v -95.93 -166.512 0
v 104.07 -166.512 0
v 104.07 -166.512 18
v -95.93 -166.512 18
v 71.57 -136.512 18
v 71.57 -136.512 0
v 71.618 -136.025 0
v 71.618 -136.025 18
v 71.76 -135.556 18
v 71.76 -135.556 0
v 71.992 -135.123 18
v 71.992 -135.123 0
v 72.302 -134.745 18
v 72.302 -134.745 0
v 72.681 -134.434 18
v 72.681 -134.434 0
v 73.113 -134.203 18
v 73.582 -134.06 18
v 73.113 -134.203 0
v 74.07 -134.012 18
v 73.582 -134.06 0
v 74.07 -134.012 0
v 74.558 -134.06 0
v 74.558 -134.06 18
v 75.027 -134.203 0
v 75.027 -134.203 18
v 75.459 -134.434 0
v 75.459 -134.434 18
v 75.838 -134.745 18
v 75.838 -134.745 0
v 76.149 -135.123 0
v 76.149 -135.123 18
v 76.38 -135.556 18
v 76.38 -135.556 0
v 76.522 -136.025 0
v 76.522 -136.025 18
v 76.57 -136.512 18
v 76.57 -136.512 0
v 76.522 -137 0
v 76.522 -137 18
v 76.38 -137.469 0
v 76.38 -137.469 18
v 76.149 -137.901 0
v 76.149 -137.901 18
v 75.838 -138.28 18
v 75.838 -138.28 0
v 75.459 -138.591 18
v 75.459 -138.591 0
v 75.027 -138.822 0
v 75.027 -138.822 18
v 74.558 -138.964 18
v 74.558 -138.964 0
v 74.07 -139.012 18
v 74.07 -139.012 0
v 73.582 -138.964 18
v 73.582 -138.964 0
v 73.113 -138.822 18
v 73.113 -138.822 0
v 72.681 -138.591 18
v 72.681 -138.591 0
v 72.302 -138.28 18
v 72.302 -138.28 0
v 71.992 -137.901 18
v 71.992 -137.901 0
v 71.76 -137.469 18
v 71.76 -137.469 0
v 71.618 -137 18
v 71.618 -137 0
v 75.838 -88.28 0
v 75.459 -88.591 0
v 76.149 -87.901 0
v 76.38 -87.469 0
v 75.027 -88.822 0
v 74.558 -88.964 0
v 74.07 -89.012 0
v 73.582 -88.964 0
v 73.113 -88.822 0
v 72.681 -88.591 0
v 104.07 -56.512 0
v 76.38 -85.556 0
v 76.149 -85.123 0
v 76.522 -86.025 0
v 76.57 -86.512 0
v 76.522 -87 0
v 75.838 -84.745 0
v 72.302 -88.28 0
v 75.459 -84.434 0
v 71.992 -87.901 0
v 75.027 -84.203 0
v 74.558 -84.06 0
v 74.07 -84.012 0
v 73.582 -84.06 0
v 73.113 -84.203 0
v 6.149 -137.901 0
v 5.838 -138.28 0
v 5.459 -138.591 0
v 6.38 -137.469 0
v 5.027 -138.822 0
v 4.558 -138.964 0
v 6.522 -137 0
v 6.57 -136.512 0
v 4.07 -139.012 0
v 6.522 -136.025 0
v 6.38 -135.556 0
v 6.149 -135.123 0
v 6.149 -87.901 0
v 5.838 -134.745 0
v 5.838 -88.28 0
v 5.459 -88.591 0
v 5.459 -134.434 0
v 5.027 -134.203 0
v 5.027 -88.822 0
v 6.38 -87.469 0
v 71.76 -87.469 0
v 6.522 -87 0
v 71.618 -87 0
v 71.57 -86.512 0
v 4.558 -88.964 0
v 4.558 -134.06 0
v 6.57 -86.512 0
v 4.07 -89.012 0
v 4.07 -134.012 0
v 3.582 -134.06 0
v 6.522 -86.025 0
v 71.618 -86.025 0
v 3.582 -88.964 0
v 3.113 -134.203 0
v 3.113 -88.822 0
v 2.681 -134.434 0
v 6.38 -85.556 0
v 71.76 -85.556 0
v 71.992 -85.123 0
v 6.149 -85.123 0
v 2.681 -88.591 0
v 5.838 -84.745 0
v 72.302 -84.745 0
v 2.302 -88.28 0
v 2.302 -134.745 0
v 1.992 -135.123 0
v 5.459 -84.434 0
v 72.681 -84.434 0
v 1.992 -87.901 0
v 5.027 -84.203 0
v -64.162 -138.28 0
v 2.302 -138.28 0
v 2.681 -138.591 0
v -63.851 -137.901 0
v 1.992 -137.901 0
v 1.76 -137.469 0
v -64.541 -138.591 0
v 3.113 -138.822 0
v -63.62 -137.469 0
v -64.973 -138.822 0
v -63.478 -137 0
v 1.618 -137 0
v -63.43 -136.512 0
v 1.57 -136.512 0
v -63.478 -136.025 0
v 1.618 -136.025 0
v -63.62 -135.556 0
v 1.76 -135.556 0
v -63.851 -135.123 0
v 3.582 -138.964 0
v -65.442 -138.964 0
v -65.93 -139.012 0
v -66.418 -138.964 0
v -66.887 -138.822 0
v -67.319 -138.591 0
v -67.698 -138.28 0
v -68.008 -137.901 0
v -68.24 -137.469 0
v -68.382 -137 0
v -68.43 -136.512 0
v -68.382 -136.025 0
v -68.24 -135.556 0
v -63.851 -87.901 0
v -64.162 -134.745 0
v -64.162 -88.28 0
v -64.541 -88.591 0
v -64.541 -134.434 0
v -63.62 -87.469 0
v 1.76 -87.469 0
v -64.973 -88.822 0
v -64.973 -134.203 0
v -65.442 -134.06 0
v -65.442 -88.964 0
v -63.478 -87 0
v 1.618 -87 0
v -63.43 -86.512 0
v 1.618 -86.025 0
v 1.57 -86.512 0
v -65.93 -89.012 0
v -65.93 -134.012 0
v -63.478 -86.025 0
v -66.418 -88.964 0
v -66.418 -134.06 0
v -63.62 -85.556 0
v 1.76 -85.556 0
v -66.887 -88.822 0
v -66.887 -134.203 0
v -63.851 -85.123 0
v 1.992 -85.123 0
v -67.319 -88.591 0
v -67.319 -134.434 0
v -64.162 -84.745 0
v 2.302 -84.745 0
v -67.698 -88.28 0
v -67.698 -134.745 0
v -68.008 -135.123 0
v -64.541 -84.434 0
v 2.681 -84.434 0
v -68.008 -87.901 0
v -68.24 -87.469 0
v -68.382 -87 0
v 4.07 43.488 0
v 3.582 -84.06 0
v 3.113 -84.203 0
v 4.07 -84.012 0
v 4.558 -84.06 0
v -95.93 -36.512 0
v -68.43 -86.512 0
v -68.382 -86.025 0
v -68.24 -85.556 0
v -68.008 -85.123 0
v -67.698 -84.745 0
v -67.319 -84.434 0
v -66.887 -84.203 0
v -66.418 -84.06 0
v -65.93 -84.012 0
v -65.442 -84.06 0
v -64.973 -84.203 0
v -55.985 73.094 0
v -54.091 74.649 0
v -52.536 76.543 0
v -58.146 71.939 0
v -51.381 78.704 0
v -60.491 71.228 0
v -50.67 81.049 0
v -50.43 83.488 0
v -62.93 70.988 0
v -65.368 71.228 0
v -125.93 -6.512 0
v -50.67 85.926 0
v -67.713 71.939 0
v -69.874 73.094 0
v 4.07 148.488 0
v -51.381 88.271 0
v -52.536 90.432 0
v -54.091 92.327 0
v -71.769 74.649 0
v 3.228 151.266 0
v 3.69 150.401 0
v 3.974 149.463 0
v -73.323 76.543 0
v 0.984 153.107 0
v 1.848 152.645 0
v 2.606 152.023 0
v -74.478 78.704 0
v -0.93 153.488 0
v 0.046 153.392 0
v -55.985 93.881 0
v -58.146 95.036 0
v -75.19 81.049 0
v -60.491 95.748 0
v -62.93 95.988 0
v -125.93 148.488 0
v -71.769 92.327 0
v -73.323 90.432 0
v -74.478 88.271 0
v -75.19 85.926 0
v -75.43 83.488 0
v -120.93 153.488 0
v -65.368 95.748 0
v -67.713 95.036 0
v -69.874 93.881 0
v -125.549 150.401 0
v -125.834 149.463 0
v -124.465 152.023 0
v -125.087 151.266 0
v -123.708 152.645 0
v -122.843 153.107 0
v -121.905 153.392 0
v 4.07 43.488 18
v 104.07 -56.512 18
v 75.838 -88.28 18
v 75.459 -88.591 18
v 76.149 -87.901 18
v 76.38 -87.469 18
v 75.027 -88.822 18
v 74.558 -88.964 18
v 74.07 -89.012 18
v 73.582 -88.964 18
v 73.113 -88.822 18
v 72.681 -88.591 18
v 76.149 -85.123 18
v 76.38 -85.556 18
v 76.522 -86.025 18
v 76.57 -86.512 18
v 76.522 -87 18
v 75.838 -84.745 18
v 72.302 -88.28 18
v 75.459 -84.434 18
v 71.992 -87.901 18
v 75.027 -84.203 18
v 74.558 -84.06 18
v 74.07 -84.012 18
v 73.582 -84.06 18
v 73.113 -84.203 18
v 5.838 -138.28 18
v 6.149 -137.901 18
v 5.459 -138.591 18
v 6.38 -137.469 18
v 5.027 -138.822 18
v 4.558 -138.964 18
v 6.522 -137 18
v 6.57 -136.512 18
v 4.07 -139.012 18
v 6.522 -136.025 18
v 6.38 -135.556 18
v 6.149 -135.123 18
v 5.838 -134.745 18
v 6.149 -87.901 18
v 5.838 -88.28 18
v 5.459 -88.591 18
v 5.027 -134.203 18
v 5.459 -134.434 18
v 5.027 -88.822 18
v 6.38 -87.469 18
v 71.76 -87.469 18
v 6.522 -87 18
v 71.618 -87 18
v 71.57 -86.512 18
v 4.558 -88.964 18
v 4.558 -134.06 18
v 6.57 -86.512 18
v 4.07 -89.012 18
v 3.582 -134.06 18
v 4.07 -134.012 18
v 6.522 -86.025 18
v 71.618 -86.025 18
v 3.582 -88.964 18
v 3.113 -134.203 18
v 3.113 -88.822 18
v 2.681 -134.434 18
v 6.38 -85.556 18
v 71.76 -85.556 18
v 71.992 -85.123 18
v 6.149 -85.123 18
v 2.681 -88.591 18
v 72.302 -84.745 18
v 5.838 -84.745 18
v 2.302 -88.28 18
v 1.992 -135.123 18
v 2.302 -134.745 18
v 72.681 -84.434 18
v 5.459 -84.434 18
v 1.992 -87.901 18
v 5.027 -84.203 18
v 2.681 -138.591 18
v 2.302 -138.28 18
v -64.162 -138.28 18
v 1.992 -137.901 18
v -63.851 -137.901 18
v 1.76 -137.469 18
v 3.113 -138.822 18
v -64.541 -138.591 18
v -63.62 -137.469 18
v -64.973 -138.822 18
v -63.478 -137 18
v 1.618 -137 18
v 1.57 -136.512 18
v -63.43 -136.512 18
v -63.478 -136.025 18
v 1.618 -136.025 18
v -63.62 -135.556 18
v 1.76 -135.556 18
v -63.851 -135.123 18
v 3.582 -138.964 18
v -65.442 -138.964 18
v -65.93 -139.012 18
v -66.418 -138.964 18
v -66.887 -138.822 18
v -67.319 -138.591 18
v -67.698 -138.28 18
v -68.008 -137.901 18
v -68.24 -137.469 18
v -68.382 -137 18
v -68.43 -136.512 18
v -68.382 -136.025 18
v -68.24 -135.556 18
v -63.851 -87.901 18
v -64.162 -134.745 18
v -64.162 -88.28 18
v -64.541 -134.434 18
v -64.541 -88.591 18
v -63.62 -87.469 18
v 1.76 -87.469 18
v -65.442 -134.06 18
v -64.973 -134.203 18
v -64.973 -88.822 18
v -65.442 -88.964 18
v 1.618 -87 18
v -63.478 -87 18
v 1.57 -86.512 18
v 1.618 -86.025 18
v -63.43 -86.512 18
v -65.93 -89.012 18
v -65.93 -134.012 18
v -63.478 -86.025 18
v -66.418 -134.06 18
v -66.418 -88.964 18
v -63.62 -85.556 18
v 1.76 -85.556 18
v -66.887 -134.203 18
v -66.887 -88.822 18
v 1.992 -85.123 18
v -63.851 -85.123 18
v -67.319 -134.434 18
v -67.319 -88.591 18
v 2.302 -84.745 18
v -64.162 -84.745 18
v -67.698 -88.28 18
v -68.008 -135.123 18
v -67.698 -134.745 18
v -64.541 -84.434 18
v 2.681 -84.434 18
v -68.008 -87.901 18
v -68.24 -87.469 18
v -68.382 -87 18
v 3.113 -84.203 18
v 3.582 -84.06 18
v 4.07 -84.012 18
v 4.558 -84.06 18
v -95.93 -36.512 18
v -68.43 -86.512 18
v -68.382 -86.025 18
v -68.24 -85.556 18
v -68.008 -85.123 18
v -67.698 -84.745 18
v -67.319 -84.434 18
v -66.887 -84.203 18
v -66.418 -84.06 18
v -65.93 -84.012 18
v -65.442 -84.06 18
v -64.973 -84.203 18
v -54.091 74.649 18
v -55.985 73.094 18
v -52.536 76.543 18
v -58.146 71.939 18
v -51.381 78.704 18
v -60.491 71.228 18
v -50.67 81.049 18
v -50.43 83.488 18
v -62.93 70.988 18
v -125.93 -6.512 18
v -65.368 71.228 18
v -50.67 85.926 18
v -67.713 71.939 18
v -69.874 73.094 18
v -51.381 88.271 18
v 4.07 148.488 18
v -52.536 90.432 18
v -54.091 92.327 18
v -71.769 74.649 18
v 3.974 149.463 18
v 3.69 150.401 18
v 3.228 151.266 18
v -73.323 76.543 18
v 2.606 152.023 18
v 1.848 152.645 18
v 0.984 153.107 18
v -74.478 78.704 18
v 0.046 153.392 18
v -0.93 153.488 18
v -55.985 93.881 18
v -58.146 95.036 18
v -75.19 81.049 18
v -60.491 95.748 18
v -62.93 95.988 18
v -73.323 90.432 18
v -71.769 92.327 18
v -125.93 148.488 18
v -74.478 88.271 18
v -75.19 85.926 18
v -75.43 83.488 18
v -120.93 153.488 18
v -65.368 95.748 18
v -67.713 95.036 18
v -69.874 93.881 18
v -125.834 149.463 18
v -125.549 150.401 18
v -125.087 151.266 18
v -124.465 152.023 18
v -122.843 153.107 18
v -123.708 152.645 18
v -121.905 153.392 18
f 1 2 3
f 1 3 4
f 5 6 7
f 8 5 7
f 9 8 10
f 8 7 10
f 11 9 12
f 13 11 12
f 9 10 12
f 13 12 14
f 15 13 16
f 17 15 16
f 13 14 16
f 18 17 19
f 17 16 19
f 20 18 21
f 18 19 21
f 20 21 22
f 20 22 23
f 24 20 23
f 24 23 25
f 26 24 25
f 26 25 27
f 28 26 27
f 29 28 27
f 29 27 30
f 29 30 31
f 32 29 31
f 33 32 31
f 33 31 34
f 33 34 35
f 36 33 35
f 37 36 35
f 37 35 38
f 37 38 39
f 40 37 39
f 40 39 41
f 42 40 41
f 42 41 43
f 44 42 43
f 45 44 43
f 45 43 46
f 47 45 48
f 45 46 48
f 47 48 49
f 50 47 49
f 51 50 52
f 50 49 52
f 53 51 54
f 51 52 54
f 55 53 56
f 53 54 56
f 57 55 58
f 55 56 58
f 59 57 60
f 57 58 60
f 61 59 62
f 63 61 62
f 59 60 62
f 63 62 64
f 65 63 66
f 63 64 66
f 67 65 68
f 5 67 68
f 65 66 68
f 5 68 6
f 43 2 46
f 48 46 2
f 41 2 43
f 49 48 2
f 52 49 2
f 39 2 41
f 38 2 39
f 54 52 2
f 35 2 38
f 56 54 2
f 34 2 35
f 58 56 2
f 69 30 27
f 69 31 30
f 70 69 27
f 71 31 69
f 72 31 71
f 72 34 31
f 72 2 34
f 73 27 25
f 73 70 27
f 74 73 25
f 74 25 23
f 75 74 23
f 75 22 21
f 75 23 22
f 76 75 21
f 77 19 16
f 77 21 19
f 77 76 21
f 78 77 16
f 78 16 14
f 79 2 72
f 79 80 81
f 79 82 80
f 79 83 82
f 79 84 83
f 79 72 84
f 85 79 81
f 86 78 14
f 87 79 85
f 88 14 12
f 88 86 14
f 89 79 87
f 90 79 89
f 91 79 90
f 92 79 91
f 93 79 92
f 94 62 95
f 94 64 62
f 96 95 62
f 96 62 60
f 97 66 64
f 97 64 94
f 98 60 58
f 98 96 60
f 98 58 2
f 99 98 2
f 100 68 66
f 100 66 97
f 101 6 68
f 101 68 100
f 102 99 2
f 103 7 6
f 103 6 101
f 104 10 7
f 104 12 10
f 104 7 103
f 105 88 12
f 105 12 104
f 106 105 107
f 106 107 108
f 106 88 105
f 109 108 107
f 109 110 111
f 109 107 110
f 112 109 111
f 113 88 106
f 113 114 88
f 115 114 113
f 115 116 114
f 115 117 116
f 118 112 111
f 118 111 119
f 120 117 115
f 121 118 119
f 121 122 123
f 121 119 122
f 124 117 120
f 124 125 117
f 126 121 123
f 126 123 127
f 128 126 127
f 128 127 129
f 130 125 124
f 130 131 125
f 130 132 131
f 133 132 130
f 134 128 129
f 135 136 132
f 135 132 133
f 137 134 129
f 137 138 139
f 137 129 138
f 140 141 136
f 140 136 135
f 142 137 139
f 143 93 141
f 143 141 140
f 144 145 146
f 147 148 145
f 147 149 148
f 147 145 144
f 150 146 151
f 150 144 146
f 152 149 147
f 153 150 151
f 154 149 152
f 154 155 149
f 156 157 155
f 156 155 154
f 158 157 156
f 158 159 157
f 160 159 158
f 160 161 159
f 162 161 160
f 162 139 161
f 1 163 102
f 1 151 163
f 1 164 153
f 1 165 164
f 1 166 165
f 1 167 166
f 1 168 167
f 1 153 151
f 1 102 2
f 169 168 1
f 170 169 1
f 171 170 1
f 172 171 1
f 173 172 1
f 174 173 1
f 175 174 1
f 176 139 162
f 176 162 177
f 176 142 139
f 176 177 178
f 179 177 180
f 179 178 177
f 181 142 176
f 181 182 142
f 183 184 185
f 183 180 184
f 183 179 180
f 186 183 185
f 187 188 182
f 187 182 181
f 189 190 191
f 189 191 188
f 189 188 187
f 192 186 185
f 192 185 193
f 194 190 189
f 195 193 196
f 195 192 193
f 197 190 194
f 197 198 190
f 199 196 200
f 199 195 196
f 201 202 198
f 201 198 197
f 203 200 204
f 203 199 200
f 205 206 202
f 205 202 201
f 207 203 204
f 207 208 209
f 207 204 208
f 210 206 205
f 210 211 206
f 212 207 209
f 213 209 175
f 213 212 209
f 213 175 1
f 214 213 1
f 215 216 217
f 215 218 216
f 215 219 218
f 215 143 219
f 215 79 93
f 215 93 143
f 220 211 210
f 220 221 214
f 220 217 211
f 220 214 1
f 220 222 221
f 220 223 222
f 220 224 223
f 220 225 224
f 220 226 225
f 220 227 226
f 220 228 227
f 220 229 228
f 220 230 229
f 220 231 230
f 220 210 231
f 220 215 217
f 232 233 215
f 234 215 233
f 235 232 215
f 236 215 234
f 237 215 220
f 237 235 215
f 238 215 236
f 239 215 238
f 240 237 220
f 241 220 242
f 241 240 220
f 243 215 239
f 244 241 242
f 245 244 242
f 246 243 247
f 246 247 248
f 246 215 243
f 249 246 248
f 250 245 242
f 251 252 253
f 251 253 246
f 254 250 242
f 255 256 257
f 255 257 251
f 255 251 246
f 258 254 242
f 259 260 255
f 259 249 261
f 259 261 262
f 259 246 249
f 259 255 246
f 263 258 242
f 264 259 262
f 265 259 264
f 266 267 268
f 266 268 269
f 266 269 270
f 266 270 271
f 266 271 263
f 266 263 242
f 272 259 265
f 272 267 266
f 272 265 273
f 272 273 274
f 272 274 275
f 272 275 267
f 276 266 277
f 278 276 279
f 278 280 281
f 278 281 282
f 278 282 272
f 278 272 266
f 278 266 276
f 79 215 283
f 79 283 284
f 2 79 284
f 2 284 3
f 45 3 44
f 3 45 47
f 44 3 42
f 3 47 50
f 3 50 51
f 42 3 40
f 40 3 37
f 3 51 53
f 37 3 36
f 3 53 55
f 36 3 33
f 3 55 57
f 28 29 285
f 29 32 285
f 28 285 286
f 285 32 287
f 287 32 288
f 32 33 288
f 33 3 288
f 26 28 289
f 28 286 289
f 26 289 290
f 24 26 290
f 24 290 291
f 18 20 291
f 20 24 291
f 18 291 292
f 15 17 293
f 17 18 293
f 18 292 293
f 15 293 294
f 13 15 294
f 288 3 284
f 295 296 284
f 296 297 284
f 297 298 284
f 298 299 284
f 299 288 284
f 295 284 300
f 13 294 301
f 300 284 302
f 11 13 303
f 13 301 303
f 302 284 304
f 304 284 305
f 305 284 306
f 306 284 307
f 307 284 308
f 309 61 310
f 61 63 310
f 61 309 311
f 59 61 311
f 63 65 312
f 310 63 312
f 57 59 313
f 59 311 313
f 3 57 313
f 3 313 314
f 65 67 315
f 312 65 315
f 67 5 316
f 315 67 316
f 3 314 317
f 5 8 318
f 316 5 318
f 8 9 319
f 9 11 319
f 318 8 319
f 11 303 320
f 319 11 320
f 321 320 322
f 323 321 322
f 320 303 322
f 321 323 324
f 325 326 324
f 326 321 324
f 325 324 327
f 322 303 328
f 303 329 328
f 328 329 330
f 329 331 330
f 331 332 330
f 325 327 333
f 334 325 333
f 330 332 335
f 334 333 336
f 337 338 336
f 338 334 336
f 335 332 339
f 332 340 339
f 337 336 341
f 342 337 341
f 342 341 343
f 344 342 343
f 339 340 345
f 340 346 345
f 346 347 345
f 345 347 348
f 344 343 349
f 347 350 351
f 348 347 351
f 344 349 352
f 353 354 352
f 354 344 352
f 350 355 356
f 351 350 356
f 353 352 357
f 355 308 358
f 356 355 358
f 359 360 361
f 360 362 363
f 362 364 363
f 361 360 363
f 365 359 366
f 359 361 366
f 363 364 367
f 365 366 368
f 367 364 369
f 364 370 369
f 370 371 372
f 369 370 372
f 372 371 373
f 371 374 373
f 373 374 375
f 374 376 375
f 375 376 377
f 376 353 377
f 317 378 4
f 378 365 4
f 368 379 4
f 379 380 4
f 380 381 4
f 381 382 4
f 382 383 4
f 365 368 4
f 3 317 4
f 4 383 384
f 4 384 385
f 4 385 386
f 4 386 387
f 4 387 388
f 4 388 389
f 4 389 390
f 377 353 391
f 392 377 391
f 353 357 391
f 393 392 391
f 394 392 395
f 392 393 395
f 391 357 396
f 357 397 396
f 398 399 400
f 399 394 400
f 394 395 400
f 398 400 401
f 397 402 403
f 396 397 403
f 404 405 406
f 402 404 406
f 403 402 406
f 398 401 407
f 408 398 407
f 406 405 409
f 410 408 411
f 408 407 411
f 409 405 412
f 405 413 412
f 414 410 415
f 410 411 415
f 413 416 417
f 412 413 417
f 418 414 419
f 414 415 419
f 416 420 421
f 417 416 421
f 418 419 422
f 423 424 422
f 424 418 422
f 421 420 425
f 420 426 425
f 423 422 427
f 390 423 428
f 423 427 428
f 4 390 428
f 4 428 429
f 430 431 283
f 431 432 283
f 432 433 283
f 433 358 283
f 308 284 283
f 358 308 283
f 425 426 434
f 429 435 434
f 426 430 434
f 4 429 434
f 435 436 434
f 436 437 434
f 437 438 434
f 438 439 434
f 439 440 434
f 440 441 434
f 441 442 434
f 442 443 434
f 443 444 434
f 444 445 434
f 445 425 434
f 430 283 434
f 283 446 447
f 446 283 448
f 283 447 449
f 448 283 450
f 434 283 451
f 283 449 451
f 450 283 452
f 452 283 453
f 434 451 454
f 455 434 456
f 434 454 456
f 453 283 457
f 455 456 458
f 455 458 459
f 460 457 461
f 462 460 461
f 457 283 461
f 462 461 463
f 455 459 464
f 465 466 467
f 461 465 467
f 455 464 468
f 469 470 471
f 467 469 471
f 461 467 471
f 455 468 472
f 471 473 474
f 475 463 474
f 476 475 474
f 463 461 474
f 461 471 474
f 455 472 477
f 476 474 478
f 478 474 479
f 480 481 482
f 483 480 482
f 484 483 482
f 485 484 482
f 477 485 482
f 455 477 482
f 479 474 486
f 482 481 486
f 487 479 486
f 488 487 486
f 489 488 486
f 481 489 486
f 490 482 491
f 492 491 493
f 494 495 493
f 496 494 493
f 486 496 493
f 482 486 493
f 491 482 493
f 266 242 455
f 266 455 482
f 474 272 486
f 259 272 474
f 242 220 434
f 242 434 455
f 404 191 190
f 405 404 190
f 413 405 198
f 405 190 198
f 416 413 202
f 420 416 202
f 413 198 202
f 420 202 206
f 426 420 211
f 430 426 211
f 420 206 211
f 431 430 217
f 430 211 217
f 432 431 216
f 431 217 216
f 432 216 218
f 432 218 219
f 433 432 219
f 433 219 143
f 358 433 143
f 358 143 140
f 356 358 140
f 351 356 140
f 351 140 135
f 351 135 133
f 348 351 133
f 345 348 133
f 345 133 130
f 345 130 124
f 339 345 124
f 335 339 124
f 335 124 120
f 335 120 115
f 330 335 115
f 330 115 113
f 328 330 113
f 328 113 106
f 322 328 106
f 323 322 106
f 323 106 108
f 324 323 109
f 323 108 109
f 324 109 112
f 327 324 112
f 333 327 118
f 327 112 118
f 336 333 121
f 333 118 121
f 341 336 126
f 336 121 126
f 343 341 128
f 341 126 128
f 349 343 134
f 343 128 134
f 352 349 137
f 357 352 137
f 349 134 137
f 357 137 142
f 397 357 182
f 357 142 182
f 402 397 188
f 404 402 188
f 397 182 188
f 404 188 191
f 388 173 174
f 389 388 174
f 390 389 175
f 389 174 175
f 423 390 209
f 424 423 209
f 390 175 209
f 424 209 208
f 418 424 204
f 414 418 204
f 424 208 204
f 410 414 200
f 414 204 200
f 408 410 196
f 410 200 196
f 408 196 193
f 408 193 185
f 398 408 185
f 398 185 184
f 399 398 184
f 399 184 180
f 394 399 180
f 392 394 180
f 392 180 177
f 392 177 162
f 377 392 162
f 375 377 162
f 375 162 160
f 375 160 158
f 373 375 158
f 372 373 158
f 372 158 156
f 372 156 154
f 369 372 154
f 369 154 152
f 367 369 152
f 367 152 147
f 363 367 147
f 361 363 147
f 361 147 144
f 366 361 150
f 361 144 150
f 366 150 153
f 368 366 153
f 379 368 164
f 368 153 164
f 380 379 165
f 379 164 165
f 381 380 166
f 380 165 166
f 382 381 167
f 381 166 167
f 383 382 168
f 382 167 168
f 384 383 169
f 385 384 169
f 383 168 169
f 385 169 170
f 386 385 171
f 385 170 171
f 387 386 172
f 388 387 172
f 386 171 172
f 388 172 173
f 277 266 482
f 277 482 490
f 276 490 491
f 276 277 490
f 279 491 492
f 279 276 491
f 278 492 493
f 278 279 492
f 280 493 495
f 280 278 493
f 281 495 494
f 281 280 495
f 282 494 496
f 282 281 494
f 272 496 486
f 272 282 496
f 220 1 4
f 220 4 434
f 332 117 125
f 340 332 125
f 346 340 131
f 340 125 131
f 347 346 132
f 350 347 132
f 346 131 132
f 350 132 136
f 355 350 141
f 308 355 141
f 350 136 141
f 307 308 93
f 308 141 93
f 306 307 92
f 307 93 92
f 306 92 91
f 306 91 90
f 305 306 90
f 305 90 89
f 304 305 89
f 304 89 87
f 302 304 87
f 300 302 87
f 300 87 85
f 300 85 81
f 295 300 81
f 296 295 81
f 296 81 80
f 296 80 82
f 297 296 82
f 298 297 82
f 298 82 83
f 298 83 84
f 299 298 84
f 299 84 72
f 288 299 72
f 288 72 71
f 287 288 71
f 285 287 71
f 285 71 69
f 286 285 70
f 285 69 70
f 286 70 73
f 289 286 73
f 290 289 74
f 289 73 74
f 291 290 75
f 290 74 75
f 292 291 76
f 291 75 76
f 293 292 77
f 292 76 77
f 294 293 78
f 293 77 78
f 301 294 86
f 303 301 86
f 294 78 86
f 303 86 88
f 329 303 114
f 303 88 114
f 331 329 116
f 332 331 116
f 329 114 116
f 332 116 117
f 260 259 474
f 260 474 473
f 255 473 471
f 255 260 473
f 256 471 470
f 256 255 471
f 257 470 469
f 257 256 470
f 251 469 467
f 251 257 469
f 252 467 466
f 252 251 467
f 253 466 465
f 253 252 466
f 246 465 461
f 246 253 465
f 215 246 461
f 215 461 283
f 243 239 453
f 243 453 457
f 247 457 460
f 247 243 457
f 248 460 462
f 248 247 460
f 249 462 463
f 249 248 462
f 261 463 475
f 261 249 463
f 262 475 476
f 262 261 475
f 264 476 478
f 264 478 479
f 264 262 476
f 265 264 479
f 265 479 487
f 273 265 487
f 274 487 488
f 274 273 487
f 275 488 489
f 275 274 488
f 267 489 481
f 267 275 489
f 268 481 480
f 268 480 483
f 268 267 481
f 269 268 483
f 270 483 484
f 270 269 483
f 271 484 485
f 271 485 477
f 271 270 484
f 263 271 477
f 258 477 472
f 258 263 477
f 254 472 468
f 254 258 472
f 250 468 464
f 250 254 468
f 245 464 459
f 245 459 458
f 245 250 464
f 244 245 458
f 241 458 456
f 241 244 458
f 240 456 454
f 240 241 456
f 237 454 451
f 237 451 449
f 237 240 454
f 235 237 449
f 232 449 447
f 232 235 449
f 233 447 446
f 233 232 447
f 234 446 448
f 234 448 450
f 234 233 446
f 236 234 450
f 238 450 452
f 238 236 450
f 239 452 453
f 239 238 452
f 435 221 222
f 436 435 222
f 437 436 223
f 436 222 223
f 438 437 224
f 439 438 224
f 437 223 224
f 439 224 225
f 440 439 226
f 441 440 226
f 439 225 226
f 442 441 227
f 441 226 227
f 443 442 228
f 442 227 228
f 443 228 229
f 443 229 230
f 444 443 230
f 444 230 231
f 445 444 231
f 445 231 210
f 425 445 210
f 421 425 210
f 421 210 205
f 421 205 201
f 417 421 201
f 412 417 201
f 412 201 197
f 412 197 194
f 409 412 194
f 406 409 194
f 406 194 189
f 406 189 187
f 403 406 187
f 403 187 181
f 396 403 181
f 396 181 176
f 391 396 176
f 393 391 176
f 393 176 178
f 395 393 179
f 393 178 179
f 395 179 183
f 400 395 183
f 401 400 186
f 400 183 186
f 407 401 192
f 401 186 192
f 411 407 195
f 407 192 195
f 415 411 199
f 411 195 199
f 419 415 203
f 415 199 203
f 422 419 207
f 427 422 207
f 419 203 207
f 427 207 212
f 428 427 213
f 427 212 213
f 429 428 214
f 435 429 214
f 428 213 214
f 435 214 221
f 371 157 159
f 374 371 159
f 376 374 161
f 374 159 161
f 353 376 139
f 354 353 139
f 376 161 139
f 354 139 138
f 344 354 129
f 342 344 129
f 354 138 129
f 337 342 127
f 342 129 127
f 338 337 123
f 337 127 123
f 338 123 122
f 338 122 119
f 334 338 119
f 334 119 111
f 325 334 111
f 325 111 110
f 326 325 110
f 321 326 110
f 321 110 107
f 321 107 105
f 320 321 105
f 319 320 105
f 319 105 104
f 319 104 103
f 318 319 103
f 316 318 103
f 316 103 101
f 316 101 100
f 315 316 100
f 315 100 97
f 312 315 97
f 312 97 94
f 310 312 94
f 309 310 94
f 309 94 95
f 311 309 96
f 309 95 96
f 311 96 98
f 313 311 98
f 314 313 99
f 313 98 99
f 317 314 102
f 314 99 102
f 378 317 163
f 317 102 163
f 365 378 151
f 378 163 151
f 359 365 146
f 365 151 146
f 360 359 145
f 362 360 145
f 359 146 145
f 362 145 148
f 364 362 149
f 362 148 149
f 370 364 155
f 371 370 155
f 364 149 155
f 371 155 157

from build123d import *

# Parameters (mm, degrees)
SKETCH1_R                      = 12.5
BOSS_EXTRUDE1_DEPTH            = 18
HOLE_FOR_M5_300_SC_NUTS_SP_1_D = 5


with BuildPart() as part:
    # Sketch1 → Boss-Extrude1 (new body)
    with BuildSketch(Plane.XY):
        with BuildLine():
            Line((4.070181983, 148.487708827), (4.070181983, 43.487708827))
            Line((4.070181983, 43.487708827), (104.070181983, -56.512291173))
            Line((104.070181983, -56.512291173), (104.070181983, -166.512291173))
            Line((104.070181983, -166.512291173), (-95.929818017, -166.512291173))
            Line((-95.929818017, -166.512291173), (-95.929818017, -36.512291173))
            Line((-95.929818017, -36.512291173), (-125.929818017, -6.512291173))
            Line((-125.929818017, -6.512291173), (-125.929818017, 148.487708827))
            ThreePointArc((-125.929818017, 148.487708827), (-124.465351923, 152.023242733), (-120.929818017, 153.487708827))
            Line((-120.929818017, 153.487708827), (-95.929818017, 153.487708827))
            Line((-95.929818017, 153.487708827), (-0.929818017, 153.487708827))
            ThreePointArc((-0.929818017, 153.487708827), (2.605715889, 152.023242733), (4.070181983, 148.487708827))
        make_face()
        with Locations((-62.929818017, 83.487708827)):
            Circle(SKETCH1_R, mode=Mode.SUBTRACT)
    extrude(amount=BOSS_EXTRUDE1_DEPTH)

    # Hole for M5 300® SC Nuts (SP)1 (through all)
    with Locations(Plane.XY.offset(18)):
        with Locations((74.070181983, -86.512291173), (74.070181983, -136.512291173), (4.070181983, -136.512291173), (-65.929818017, -136.512291173), (-65.929818017, -86.512291173), (4.070181983, -86.512291173)):
            Hole(HOLE_FOR_M5_300_SC_NUTS_SP_1_D / 2)


solid = part.part
